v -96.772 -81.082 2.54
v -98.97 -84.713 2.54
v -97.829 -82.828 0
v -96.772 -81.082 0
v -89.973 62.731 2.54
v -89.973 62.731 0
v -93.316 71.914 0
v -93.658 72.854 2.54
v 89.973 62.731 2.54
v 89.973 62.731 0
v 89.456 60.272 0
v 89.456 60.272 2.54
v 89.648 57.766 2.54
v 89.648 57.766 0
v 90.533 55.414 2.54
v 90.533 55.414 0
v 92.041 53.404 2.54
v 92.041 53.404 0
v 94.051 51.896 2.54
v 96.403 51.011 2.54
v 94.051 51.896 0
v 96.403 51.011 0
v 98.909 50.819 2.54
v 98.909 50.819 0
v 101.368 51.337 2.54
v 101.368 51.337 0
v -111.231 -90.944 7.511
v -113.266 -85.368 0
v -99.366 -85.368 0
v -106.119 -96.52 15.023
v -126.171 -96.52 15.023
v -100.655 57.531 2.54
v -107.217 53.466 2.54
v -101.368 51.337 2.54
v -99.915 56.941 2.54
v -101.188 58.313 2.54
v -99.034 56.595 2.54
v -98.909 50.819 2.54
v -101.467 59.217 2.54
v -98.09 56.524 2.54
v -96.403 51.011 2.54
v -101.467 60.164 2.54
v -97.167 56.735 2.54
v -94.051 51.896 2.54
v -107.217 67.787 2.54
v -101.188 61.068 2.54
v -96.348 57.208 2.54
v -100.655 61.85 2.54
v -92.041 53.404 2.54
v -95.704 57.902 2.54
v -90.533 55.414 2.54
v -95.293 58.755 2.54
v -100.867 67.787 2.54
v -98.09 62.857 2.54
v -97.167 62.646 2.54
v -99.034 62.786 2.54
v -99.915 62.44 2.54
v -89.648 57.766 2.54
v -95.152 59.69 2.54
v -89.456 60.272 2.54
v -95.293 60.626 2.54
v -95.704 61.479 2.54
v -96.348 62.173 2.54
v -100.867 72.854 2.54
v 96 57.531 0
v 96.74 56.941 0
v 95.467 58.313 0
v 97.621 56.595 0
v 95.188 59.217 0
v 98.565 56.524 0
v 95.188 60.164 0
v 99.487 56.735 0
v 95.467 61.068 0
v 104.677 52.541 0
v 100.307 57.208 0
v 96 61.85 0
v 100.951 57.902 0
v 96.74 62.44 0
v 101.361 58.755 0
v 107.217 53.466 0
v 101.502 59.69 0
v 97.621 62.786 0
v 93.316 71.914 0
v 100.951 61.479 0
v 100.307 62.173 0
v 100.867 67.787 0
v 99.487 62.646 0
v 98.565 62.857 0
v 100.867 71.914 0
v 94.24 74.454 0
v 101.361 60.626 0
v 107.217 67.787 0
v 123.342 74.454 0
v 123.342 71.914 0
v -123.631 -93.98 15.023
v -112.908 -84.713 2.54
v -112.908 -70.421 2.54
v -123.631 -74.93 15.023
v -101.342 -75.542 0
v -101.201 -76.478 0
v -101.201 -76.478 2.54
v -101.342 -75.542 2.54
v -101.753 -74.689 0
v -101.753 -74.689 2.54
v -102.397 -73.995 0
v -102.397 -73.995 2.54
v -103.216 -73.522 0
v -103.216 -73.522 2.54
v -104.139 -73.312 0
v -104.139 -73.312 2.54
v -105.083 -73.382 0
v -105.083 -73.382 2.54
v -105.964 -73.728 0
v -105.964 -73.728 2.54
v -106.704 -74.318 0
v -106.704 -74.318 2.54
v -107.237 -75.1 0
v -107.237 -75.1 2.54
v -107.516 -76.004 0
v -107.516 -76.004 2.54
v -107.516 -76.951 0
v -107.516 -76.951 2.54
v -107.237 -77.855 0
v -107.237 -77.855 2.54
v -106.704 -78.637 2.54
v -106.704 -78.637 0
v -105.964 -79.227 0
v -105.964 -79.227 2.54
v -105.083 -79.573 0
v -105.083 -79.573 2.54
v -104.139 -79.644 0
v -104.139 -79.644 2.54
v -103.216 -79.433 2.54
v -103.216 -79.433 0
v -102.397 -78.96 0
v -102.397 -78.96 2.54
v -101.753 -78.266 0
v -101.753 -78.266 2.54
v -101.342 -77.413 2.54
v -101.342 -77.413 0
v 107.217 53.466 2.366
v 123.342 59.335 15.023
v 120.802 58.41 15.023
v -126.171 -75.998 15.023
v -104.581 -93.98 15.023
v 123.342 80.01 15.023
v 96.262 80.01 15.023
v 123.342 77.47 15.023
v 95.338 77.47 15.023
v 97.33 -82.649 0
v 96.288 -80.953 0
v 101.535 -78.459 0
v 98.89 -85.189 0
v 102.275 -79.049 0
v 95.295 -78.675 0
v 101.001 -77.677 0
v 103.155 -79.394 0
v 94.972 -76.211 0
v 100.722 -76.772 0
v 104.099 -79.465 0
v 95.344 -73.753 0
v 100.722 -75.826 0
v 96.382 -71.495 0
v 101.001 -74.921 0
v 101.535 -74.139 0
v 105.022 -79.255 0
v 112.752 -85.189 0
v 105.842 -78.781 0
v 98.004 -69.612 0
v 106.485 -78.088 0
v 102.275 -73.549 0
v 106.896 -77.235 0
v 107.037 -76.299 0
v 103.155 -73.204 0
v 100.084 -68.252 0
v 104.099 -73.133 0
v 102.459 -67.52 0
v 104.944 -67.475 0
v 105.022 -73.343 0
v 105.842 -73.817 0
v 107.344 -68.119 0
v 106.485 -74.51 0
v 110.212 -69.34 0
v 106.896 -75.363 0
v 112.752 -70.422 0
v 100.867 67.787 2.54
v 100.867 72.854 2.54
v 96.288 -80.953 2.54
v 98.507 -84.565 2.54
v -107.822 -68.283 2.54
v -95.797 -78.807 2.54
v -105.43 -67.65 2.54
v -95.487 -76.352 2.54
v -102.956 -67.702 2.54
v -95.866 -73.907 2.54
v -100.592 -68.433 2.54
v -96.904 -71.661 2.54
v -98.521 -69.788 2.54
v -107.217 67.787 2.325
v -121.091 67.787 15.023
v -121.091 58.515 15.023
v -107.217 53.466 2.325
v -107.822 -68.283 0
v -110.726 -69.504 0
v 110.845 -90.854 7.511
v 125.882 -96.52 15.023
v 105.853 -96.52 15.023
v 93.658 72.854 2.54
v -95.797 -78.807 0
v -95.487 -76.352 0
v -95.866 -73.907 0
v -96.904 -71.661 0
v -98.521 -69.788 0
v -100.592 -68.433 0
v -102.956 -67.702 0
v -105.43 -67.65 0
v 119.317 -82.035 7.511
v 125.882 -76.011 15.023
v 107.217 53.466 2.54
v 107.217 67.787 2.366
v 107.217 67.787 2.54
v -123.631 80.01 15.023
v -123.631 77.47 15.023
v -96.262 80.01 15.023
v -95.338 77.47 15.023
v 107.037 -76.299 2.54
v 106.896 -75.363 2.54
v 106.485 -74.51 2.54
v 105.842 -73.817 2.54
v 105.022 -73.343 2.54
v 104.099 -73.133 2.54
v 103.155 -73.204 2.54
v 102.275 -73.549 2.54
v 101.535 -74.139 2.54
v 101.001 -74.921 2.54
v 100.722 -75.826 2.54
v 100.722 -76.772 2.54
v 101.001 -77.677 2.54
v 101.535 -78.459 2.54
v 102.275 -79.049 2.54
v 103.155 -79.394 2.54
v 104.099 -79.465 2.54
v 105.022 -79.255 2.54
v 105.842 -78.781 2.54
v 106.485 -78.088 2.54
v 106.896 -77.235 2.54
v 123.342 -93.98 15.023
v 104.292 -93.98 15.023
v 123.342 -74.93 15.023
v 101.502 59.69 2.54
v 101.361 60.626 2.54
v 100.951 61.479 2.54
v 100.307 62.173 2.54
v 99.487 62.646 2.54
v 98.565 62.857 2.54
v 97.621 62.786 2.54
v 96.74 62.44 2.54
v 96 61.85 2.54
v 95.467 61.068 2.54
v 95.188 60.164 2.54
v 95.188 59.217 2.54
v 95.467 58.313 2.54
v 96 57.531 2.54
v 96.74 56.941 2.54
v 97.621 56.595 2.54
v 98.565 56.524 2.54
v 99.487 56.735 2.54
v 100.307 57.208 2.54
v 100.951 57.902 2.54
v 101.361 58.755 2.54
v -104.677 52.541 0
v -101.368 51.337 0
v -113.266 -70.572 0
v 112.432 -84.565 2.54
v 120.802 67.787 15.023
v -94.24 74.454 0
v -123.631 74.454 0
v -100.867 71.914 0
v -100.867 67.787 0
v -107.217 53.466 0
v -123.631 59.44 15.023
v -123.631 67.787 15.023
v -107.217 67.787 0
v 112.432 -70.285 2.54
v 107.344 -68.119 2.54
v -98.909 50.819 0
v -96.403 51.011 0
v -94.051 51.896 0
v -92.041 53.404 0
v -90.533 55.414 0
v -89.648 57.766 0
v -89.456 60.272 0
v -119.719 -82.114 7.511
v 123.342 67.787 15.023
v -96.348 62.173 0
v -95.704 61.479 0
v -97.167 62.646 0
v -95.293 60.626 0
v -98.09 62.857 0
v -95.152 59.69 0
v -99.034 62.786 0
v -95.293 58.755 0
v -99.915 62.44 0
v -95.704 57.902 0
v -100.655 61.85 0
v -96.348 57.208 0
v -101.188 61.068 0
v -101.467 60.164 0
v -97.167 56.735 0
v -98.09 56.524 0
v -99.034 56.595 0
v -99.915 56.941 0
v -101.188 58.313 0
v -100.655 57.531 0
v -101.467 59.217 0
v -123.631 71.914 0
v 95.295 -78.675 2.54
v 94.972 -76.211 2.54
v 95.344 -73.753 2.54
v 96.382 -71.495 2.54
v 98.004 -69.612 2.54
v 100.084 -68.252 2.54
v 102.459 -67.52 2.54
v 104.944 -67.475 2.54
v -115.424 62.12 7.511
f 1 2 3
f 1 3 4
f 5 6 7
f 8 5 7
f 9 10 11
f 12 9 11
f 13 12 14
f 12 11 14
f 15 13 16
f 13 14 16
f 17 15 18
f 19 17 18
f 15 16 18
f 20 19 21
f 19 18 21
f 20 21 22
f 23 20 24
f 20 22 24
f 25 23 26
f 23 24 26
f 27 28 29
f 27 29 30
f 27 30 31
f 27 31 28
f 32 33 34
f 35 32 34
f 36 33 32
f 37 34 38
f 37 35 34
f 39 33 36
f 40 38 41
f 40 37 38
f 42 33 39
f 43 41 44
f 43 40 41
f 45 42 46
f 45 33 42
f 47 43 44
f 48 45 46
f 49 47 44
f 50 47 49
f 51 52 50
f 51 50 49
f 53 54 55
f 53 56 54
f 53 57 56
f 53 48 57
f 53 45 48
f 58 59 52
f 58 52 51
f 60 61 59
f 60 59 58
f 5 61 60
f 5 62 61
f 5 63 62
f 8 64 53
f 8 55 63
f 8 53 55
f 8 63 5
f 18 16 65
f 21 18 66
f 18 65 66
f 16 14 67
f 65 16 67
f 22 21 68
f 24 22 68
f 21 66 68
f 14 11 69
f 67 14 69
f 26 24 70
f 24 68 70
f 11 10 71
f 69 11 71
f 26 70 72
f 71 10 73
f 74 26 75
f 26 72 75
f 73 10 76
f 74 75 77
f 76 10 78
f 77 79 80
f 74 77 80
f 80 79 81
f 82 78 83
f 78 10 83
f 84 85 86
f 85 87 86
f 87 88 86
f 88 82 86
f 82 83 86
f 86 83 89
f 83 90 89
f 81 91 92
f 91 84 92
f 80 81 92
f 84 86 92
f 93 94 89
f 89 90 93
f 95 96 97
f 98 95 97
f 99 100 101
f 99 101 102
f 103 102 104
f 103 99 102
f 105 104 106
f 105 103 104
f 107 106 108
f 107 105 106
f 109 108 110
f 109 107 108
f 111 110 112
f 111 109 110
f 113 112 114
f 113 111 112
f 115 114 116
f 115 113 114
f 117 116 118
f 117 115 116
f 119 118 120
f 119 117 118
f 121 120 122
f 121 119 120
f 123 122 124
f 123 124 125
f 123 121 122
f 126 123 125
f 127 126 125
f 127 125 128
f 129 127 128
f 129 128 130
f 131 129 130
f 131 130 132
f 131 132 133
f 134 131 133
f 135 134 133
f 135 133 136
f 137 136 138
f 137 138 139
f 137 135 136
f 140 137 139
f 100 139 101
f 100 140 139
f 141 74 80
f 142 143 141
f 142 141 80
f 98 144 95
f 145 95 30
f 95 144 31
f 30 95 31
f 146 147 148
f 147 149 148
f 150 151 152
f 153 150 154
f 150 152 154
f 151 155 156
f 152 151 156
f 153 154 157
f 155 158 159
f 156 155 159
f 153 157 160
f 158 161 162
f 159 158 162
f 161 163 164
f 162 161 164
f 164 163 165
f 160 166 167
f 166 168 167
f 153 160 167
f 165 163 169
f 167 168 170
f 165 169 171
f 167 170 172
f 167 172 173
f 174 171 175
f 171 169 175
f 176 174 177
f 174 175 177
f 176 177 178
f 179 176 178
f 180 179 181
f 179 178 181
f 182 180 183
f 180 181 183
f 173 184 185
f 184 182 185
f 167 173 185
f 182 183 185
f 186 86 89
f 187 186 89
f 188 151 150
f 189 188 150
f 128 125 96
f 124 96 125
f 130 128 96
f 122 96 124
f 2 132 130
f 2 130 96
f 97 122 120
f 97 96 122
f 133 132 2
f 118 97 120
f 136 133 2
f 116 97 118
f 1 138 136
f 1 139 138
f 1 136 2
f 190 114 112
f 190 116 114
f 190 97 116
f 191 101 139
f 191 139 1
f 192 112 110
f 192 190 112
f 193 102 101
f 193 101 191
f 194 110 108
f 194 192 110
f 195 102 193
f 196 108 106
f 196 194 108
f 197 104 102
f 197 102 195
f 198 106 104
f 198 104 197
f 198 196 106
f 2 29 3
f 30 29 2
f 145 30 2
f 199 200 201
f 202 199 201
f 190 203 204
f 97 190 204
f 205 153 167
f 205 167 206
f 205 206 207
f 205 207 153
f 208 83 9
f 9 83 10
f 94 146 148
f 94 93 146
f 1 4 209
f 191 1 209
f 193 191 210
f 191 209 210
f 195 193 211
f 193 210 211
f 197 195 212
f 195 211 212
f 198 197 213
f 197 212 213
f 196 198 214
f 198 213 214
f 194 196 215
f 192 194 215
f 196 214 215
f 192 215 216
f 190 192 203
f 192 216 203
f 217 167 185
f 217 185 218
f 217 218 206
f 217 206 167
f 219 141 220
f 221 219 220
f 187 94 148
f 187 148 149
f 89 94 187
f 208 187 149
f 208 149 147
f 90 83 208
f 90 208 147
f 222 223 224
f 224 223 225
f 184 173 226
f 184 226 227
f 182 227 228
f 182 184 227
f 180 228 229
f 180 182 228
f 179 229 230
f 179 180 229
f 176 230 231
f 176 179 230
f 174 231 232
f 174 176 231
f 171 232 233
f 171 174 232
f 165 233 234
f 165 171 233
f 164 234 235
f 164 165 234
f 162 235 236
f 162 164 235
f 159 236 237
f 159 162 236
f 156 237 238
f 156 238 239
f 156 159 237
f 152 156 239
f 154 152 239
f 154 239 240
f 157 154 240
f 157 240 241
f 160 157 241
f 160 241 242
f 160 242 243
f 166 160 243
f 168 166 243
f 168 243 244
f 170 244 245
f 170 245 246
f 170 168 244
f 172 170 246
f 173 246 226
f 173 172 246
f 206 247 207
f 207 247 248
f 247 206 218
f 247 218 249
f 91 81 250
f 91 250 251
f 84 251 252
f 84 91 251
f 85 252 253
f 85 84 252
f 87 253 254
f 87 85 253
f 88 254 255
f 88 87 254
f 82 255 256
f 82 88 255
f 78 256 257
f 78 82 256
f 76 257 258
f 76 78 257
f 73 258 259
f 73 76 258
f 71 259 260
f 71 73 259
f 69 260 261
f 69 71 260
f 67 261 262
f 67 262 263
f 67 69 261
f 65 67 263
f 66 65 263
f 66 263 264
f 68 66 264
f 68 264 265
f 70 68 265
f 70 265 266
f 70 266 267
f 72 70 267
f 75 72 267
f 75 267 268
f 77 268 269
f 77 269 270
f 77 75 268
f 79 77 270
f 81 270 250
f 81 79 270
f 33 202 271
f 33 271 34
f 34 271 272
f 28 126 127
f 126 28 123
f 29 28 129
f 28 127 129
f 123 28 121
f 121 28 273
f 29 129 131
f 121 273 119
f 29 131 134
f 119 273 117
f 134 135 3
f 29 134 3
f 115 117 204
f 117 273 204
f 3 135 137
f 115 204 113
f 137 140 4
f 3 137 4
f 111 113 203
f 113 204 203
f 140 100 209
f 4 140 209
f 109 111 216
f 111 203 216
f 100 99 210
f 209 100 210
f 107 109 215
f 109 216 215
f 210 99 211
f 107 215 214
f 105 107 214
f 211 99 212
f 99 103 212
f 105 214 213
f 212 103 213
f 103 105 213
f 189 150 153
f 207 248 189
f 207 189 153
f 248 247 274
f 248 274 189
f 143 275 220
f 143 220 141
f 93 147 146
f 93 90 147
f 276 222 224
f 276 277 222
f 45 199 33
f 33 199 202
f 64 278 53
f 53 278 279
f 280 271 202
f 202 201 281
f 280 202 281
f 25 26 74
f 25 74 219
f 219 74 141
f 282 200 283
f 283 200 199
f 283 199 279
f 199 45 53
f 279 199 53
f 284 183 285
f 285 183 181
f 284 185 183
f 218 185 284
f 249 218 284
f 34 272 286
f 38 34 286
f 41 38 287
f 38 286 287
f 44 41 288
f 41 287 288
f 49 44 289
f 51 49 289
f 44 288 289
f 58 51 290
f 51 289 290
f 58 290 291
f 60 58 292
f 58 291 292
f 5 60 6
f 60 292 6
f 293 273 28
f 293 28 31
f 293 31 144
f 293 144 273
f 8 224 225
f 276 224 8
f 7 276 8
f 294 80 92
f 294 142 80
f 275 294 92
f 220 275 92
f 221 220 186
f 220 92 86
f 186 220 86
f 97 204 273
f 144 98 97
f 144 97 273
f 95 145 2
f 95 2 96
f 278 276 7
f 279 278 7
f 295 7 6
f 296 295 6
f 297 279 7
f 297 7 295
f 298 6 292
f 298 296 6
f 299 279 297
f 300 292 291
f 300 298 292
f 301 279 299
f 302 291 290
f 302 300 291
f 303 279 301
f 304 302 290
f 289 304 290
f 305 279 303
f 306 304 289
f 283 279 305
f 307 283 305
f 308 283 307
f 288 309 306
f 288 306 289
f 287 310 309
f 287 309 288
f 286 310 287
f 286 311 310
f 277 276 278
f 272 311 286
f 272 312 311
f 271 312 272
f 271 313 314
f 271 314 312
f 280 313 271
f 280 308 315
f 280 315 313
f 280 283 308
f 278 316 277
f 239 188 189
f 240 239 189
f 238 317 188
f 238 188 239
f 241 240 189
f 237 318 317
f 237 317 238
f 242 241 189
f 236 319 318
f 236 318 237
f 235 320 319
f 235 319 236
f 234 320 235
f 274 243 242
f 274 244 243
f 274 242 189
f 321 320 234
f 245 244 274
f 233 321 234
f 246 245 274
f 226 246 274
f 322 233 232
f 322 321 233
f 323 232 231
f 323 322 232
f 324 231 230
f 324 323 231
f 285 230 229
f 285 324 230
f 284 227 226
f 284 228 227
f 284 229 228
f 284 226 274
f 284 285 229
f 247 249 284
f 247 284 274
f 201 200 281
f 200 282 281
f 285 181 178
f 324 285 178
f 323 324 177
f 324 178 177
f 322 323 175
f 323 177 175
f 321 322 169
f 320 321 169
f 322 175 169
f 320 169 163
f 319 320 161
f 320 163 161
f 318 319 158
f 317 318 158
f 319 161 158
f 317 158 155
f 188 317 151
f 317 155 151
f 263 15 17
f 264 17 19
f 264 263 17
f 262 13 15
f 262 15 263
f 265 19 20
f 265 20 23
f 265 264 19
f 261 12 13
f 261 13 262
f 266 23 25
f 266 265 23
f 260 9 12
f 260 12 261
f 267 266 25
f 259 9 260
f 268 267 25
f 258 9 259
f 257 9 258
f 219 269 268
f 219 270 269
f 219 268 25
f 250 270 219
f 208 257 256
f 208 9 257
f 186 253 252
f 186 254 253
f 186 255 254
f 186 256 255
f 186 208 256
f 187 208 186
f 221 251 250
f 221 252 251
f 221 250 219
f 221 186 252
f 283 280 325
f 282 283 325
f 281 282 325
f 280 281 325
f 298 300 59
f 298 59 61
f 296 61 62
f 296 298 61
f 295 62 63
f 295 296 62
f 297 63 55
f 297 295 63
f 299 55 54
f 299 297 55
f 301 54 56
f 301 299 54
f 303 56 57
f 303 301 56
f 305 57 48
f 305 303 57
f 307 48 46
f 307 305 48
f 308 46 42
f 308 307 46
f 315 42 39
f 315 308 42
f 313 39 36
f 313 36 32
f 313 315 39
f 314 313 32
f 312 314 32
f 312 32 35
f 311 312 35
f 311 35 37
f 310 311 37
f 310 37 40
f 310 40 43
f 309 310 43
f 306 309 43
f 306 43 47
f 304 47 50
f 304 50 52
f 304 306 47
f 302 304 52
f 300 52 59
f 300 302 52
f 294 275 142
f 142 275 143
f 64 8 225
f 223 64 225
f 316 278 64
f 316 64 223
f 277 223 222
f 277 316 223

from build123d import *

# Parameters (mm, degrees)
SKETCH4_7_R              = 3.175
BOSS_EXTRUDE7_DEPTH      = 2.54
SKETCH4_9_R              = 3.175
BOSS_EXTRUDE8_DEPTH      = 2.54
BOSS_EXTRUDE9_OUTLINE_R  = 3.175
BOSS_EXTRUDE9_DEPTH      = 2.54
BOSS_EXTRUDE10_OUTLINE_R = 3.175
BOSS_EXTRUDE10_DEPTH     = 2.54


# Read off the part's stored shape, not the designer's step: Boss-Extrude9, Boss-Extrude10
with BuildPart() as part:
    # Sketch9 → Loft2 section 0
    with BuildSketch(Plane.XY):
        with BuildLine():
            Line((-113.266429258, -70.57186866), (-113.266429258, -85.367634727))
            Line((-113.266429258, -85.367634727), (-99.366399677, -85.367634727))
            Line((-99.366399677, -85.367634727), (-97.8285786, -82.827634727))
            Line((-97.8285786, -82.827634727), (-110.726429258, -82.827634727))
            Line((-110.726429258, -82.827634727), (-110.726429258, -69.503807701))
            Line((-110.726429258, -69.503807701), (-113.266429258, -70.57186866))
        make_face()
    # Sketch8 → Loft2 section 1
    with BuildSketch(Plane.XY.offset(15.022907724)):
        with BuildLine():
            Line((-104.580681896, -93.98), (-123.630681896, -93.98))
            Line((-123.630681896, -93.98), (-123.630681896, -74.93))
            Line((-123.630681896, -74.93), (-126.170681896, -75.998060958))
            Line((-126.170681896, -75.998060958), (-126.170681896, -96.52))
            Line((-126.170681896, -96.52), (-106.118502973, -96.52))
            Line((-106.118502973, -96.52), (-104.580681896, -93.98))
        make_face()
    loft()

    # Sketch4<7> → Boss-Extrude7 (add)
    with BuildSketch(Plane.XY):
        with BuildLine():
            Line((-107.82238401, -68.282667012), (-113.266429258, -70.57186866))
            Line((-113.266429258, -70.57186866), (-113.266429258, -85.367634727))
            Line((-113.266429258, -85.367634727), (-99.366399677, -85.367634727))
            Line((-99.366399677, -85.367634727), (-96.771633973, -81.081892394))
            ThreePointArc((-96.771633973, -81.081892394), (-97.647459705, -70.667895597), (-107.82238401, -68.282667012))
        make_face()
        with Locations((-104.376429258, -76.477634727)):
            Circle(SKETCH4_7_R, mode=Mode.SUBTRACT)
    extrude(amount=BOSS_EXTRUDE7_DEPTH)


with BuildPart() as body_2:
    # Sketch11 → Loft3 section 0
    with BuildSketch(Plane.XY):
        with BuildLine():
            Line((98.890490417, -85.188992609), (112.752003689, -85.188992609))
            Line((112.752003689, -85.188992609), (112.752003689, -70.421530974))
            Line((112.752003689, -70.421530974), (110.212003689, -69.340220039))
            Line((110.212003689, -69.340220039), (110.212003689, -82.648992609))
            Line((110.212003689, -82.648992609), (97.329707935, -82.648992609))
            Line((97.329707935, -82.648992609), (98.890490417, -85.188992609))
        make_face()
    # Sketch10 → Loft3 section 1
    with BuildSketch(Plane.XY.offset(15.022907724)):
        with BuildLine():
            Line((123.3424, -93.98), (123.3424, -74.93))
            Line((123.3424, -74.93), (125.8824, -76.011310934))
            Line((125.8824, -76.011310934), (125.8824, -96.52))
            Line((125.8824, -96.52), (105.853182483, -96.52))
            Line((105.853182483, -96.52), (104.2924, -93.98))
            Line((104.2924, -93.98), (123.3424, -93.98))
        make_face()
    loft()

    # Sketch4<9> → Boss-Extrude8 (add)
    with BuildSketch(Plane.XY):
        with BuildLine():
            ThreePointArc((107.344182942, -68.119351562), (97.126751505, -70.496538128), (96.287708925, -80.953255045))
            Line((96.287708925, -80.953255045), (98.890490417, -85.188992609))
            Line((98.890490417, -85.188992609), (112.752003689, -85.188992609))
            Line((112.752003689, -85.188992609), (112.752003689, -70.421530974))
            Line((112.752003689, -70.421530974), (107.344182942, -68.119351562))
        make_face()
        with Locations((103.862003689, -76.298992609)):
            Circle(SKETCH4_9_R, mode=Mode.SUBTRACT)
    extrude(amount=BOSS_EXTRUDE8_DEPTH)


with BuildPart() as body_3:
    # Sketch12 → Loft4 section 0
    with BuildSketch(Plane.XY.offset(15.022907724)):
        with BuildLine():
            Line((96.262433744, 80.01), (123.3424, 80.01))
            Line((123.3424, 80.01), (123.3424, 77.47))
            Line((123.3424, 77.47), (95.337949349, 77.47))
            Line((95.337949349, 77.47), (96.262433744, 80.01))
        make_face()
    # Sketch14 → Loft4 section 1
    with BuildSketch(Plane.XY):
        with BuildLine():
            Line((93.315797821, 71.91418434), (94.240282216, 74.45418434))
            Line((94.240282216, 74.45418434), (123.3424, 74.45418434))
            Line((123.3424, 74.45418434), (123.3424, 71.91418434))
            Line((123.3424, 71.91418434), (93.315797821, 71.91418434))
        make_face()
    loft()



with BuildPart() as body_4:
    # Sketch14<3> → Loft5 section 0
    with BuildSketch(Plane.XY):
        with BuildLine():
            Line((107.217257067, 67.78668434), (104.677257067, 67.78668434))
            Line((104.677257067, 67.78668434), (104.677257067, 52.54110493))
            Line((104.677257067, 52.54110493), (107.217257067, 53.465589325))
            Line((107.217257067, 53.465589325), (107.217257067, 67.78668434))
        make_face()
    # Sketch12<3> → Loft5 section 1
    with BuildSketch(Plane.XY.offset(15.022907724)):
        with BuildLine():
            Line((123.3424, 59.334661376), (123.3424, 67.78668434))
            Line((123.3424, 67.78668434), (120.8024, 67.78668434))
            Line((120.8024, 67.78668434), (120.8024, 58.410176981))
            Line((120.8024, 58.410176981), (123.3424, 59.334661376))
        make_face()
    loft()


with BuildPart() as body_3_1:
    add(body_3.part)

    add(body_4.part)  # Boss-Extrude9 merges body 4
    # Boss-Extrude9 outline → Boss-Extrude9 (add)
    with BuildSketch(Plane.XY):
        with BuildLine():
            ThreePointArc((89.973389669, 62.730993414), (92.041077783, 53.404255055), (101.367816142, 51.336566941))
            Line((101.367816142, 51.336566941), (107.217257067, 53.465589325))
            Line((107.217257067, 53.465589325), (107.217257067, 67.78668434))
            Line((107.217257067, 67.78668434), (100.867257067, 67.78668434))
            Line((100.867257067, 67.78668434), (100.867257067, 74.45418434))
            Line((100.867257067, 74.45418434), (94.240282216, 74.45418434))
            Line((94.240282216, 74.45418434), (89.973389669, 62.730993414))
        make_face()
        with Locations((98.327257067, 59.69043434)):
            Circle(BOSS_EXTRUDE9_OUTLINE_R, mode=Mode.SUBTRACT)
    extrude(amount=BOSS_EXTRUDE9_DEPTH)


with BuildPart() as body_4_2:
    # Sketch16 → Loft6 section 0
    with BuildSketch(Plane.XY):
        with BuildLine():
            Line((-104.677257067, 67.78668434), (-104.677257067, 52.54110493))
            Line((-104.677257067, 52.54110493), (-107.217257067, 53.465589325))
            Line((-107.217257067, 53.465589325), (-107.217257067, 67.78668434))
            Line((-107.217257067, 67.78668434), (-104.677257067, 67.78668434))
        make_face()
    # Sketch15 → Loft6 section 1
    with BuildSketch(Plane.XY.offset(15.022907724)):
        with BuildLine():
            Line((-123.630681896, 67.78668434), (-121.090681896, 67.78668434))
            Line((-121.090681896, 67.78668434), (-121.090681896, 58.51510301))
            Line((-121.090681896, 58.51510301), (-123.630681896, 59.439587405))
            Line((-123.630681896, 59.439587405), (-123.630681896, 67.78668434))
        make_face()
    loft()



with BuildPart() as body_5:
    # Sketch15<3> → Loft7 section 0
    with BuildSketch(Plane.XY.offset(15.022907724)):
        with BuildLine():
            Line((-123.630681896, 80.01), (-96.262433744, 80.01))
            Line((-96.262433744, 80.01), (-95.337949349, 77.47))
            Line((-95.337949349, 77.47), (-123.630681896, 77.47))
            Line((-123.630681896, 77.47), (-123.630681896, 80.01))
        make_face()
    # Sketch16<3> → Loft7 section 1
    with BuildSketch(Plane.XY):
        with BuildLine():
            Line((-93.315797821, 71.91418434), (-94.240282216, 74.45418434))
            Line((-94.240282216, 74.45418434), (-123.630681896, 74.45418434))
            Line((-123.630681896, 74.45418434), (-123.630681896, 71.91418434))
            Line((-123.630681896, 71.91418434), (-93.315797821, 71.91418434))
        make_face()
    loft()


with BuildPart() as body_4_2_1:
    add(body_4_2.part)

    add(body_5.part)  # Boss-Extrude10 merges body 5
    # Boss-Extrude10 outline → Boss-Extrude10 (add)
    with BuildSketch(Plane.XY):
        with BuildLine():
            Line((-107.217257067, 53.465589325), (-101.367816142, 51.336566941))
            ThreePointArc((-101.367816142, 51.336566941), (-92.041077783, 53.404255055), (-89.973389669, 62.730993414))
            Line((-89.973389669, 62.730993414), (-94.240282216, 74.45418434))
            Line((-94.240282216, 74.45418434), (-100.867257067, 74.45418434))
            Line((-100.867257067, 74.45418434), (-100.867257067, 67.78668434))
            Line((-100.867257067, 67.78668434), (-107.217257067, 67.78668434))
            Line((-107.217257067, 67.78668434), (-107.217257067, 53.465589325))
        make_face()
        with Locations((-98.327257067, 59.69043434)):
            Circle(BOSS_EXTRUDE10_OUTLINE_R, mode=Mode.SUBTRACT)
    extrude(amount=BOSS_EXTRUDE10_DEPTH)


solid = Compound([part.part, body_2.part, body_3_1.part, body_4_2_1.part])
